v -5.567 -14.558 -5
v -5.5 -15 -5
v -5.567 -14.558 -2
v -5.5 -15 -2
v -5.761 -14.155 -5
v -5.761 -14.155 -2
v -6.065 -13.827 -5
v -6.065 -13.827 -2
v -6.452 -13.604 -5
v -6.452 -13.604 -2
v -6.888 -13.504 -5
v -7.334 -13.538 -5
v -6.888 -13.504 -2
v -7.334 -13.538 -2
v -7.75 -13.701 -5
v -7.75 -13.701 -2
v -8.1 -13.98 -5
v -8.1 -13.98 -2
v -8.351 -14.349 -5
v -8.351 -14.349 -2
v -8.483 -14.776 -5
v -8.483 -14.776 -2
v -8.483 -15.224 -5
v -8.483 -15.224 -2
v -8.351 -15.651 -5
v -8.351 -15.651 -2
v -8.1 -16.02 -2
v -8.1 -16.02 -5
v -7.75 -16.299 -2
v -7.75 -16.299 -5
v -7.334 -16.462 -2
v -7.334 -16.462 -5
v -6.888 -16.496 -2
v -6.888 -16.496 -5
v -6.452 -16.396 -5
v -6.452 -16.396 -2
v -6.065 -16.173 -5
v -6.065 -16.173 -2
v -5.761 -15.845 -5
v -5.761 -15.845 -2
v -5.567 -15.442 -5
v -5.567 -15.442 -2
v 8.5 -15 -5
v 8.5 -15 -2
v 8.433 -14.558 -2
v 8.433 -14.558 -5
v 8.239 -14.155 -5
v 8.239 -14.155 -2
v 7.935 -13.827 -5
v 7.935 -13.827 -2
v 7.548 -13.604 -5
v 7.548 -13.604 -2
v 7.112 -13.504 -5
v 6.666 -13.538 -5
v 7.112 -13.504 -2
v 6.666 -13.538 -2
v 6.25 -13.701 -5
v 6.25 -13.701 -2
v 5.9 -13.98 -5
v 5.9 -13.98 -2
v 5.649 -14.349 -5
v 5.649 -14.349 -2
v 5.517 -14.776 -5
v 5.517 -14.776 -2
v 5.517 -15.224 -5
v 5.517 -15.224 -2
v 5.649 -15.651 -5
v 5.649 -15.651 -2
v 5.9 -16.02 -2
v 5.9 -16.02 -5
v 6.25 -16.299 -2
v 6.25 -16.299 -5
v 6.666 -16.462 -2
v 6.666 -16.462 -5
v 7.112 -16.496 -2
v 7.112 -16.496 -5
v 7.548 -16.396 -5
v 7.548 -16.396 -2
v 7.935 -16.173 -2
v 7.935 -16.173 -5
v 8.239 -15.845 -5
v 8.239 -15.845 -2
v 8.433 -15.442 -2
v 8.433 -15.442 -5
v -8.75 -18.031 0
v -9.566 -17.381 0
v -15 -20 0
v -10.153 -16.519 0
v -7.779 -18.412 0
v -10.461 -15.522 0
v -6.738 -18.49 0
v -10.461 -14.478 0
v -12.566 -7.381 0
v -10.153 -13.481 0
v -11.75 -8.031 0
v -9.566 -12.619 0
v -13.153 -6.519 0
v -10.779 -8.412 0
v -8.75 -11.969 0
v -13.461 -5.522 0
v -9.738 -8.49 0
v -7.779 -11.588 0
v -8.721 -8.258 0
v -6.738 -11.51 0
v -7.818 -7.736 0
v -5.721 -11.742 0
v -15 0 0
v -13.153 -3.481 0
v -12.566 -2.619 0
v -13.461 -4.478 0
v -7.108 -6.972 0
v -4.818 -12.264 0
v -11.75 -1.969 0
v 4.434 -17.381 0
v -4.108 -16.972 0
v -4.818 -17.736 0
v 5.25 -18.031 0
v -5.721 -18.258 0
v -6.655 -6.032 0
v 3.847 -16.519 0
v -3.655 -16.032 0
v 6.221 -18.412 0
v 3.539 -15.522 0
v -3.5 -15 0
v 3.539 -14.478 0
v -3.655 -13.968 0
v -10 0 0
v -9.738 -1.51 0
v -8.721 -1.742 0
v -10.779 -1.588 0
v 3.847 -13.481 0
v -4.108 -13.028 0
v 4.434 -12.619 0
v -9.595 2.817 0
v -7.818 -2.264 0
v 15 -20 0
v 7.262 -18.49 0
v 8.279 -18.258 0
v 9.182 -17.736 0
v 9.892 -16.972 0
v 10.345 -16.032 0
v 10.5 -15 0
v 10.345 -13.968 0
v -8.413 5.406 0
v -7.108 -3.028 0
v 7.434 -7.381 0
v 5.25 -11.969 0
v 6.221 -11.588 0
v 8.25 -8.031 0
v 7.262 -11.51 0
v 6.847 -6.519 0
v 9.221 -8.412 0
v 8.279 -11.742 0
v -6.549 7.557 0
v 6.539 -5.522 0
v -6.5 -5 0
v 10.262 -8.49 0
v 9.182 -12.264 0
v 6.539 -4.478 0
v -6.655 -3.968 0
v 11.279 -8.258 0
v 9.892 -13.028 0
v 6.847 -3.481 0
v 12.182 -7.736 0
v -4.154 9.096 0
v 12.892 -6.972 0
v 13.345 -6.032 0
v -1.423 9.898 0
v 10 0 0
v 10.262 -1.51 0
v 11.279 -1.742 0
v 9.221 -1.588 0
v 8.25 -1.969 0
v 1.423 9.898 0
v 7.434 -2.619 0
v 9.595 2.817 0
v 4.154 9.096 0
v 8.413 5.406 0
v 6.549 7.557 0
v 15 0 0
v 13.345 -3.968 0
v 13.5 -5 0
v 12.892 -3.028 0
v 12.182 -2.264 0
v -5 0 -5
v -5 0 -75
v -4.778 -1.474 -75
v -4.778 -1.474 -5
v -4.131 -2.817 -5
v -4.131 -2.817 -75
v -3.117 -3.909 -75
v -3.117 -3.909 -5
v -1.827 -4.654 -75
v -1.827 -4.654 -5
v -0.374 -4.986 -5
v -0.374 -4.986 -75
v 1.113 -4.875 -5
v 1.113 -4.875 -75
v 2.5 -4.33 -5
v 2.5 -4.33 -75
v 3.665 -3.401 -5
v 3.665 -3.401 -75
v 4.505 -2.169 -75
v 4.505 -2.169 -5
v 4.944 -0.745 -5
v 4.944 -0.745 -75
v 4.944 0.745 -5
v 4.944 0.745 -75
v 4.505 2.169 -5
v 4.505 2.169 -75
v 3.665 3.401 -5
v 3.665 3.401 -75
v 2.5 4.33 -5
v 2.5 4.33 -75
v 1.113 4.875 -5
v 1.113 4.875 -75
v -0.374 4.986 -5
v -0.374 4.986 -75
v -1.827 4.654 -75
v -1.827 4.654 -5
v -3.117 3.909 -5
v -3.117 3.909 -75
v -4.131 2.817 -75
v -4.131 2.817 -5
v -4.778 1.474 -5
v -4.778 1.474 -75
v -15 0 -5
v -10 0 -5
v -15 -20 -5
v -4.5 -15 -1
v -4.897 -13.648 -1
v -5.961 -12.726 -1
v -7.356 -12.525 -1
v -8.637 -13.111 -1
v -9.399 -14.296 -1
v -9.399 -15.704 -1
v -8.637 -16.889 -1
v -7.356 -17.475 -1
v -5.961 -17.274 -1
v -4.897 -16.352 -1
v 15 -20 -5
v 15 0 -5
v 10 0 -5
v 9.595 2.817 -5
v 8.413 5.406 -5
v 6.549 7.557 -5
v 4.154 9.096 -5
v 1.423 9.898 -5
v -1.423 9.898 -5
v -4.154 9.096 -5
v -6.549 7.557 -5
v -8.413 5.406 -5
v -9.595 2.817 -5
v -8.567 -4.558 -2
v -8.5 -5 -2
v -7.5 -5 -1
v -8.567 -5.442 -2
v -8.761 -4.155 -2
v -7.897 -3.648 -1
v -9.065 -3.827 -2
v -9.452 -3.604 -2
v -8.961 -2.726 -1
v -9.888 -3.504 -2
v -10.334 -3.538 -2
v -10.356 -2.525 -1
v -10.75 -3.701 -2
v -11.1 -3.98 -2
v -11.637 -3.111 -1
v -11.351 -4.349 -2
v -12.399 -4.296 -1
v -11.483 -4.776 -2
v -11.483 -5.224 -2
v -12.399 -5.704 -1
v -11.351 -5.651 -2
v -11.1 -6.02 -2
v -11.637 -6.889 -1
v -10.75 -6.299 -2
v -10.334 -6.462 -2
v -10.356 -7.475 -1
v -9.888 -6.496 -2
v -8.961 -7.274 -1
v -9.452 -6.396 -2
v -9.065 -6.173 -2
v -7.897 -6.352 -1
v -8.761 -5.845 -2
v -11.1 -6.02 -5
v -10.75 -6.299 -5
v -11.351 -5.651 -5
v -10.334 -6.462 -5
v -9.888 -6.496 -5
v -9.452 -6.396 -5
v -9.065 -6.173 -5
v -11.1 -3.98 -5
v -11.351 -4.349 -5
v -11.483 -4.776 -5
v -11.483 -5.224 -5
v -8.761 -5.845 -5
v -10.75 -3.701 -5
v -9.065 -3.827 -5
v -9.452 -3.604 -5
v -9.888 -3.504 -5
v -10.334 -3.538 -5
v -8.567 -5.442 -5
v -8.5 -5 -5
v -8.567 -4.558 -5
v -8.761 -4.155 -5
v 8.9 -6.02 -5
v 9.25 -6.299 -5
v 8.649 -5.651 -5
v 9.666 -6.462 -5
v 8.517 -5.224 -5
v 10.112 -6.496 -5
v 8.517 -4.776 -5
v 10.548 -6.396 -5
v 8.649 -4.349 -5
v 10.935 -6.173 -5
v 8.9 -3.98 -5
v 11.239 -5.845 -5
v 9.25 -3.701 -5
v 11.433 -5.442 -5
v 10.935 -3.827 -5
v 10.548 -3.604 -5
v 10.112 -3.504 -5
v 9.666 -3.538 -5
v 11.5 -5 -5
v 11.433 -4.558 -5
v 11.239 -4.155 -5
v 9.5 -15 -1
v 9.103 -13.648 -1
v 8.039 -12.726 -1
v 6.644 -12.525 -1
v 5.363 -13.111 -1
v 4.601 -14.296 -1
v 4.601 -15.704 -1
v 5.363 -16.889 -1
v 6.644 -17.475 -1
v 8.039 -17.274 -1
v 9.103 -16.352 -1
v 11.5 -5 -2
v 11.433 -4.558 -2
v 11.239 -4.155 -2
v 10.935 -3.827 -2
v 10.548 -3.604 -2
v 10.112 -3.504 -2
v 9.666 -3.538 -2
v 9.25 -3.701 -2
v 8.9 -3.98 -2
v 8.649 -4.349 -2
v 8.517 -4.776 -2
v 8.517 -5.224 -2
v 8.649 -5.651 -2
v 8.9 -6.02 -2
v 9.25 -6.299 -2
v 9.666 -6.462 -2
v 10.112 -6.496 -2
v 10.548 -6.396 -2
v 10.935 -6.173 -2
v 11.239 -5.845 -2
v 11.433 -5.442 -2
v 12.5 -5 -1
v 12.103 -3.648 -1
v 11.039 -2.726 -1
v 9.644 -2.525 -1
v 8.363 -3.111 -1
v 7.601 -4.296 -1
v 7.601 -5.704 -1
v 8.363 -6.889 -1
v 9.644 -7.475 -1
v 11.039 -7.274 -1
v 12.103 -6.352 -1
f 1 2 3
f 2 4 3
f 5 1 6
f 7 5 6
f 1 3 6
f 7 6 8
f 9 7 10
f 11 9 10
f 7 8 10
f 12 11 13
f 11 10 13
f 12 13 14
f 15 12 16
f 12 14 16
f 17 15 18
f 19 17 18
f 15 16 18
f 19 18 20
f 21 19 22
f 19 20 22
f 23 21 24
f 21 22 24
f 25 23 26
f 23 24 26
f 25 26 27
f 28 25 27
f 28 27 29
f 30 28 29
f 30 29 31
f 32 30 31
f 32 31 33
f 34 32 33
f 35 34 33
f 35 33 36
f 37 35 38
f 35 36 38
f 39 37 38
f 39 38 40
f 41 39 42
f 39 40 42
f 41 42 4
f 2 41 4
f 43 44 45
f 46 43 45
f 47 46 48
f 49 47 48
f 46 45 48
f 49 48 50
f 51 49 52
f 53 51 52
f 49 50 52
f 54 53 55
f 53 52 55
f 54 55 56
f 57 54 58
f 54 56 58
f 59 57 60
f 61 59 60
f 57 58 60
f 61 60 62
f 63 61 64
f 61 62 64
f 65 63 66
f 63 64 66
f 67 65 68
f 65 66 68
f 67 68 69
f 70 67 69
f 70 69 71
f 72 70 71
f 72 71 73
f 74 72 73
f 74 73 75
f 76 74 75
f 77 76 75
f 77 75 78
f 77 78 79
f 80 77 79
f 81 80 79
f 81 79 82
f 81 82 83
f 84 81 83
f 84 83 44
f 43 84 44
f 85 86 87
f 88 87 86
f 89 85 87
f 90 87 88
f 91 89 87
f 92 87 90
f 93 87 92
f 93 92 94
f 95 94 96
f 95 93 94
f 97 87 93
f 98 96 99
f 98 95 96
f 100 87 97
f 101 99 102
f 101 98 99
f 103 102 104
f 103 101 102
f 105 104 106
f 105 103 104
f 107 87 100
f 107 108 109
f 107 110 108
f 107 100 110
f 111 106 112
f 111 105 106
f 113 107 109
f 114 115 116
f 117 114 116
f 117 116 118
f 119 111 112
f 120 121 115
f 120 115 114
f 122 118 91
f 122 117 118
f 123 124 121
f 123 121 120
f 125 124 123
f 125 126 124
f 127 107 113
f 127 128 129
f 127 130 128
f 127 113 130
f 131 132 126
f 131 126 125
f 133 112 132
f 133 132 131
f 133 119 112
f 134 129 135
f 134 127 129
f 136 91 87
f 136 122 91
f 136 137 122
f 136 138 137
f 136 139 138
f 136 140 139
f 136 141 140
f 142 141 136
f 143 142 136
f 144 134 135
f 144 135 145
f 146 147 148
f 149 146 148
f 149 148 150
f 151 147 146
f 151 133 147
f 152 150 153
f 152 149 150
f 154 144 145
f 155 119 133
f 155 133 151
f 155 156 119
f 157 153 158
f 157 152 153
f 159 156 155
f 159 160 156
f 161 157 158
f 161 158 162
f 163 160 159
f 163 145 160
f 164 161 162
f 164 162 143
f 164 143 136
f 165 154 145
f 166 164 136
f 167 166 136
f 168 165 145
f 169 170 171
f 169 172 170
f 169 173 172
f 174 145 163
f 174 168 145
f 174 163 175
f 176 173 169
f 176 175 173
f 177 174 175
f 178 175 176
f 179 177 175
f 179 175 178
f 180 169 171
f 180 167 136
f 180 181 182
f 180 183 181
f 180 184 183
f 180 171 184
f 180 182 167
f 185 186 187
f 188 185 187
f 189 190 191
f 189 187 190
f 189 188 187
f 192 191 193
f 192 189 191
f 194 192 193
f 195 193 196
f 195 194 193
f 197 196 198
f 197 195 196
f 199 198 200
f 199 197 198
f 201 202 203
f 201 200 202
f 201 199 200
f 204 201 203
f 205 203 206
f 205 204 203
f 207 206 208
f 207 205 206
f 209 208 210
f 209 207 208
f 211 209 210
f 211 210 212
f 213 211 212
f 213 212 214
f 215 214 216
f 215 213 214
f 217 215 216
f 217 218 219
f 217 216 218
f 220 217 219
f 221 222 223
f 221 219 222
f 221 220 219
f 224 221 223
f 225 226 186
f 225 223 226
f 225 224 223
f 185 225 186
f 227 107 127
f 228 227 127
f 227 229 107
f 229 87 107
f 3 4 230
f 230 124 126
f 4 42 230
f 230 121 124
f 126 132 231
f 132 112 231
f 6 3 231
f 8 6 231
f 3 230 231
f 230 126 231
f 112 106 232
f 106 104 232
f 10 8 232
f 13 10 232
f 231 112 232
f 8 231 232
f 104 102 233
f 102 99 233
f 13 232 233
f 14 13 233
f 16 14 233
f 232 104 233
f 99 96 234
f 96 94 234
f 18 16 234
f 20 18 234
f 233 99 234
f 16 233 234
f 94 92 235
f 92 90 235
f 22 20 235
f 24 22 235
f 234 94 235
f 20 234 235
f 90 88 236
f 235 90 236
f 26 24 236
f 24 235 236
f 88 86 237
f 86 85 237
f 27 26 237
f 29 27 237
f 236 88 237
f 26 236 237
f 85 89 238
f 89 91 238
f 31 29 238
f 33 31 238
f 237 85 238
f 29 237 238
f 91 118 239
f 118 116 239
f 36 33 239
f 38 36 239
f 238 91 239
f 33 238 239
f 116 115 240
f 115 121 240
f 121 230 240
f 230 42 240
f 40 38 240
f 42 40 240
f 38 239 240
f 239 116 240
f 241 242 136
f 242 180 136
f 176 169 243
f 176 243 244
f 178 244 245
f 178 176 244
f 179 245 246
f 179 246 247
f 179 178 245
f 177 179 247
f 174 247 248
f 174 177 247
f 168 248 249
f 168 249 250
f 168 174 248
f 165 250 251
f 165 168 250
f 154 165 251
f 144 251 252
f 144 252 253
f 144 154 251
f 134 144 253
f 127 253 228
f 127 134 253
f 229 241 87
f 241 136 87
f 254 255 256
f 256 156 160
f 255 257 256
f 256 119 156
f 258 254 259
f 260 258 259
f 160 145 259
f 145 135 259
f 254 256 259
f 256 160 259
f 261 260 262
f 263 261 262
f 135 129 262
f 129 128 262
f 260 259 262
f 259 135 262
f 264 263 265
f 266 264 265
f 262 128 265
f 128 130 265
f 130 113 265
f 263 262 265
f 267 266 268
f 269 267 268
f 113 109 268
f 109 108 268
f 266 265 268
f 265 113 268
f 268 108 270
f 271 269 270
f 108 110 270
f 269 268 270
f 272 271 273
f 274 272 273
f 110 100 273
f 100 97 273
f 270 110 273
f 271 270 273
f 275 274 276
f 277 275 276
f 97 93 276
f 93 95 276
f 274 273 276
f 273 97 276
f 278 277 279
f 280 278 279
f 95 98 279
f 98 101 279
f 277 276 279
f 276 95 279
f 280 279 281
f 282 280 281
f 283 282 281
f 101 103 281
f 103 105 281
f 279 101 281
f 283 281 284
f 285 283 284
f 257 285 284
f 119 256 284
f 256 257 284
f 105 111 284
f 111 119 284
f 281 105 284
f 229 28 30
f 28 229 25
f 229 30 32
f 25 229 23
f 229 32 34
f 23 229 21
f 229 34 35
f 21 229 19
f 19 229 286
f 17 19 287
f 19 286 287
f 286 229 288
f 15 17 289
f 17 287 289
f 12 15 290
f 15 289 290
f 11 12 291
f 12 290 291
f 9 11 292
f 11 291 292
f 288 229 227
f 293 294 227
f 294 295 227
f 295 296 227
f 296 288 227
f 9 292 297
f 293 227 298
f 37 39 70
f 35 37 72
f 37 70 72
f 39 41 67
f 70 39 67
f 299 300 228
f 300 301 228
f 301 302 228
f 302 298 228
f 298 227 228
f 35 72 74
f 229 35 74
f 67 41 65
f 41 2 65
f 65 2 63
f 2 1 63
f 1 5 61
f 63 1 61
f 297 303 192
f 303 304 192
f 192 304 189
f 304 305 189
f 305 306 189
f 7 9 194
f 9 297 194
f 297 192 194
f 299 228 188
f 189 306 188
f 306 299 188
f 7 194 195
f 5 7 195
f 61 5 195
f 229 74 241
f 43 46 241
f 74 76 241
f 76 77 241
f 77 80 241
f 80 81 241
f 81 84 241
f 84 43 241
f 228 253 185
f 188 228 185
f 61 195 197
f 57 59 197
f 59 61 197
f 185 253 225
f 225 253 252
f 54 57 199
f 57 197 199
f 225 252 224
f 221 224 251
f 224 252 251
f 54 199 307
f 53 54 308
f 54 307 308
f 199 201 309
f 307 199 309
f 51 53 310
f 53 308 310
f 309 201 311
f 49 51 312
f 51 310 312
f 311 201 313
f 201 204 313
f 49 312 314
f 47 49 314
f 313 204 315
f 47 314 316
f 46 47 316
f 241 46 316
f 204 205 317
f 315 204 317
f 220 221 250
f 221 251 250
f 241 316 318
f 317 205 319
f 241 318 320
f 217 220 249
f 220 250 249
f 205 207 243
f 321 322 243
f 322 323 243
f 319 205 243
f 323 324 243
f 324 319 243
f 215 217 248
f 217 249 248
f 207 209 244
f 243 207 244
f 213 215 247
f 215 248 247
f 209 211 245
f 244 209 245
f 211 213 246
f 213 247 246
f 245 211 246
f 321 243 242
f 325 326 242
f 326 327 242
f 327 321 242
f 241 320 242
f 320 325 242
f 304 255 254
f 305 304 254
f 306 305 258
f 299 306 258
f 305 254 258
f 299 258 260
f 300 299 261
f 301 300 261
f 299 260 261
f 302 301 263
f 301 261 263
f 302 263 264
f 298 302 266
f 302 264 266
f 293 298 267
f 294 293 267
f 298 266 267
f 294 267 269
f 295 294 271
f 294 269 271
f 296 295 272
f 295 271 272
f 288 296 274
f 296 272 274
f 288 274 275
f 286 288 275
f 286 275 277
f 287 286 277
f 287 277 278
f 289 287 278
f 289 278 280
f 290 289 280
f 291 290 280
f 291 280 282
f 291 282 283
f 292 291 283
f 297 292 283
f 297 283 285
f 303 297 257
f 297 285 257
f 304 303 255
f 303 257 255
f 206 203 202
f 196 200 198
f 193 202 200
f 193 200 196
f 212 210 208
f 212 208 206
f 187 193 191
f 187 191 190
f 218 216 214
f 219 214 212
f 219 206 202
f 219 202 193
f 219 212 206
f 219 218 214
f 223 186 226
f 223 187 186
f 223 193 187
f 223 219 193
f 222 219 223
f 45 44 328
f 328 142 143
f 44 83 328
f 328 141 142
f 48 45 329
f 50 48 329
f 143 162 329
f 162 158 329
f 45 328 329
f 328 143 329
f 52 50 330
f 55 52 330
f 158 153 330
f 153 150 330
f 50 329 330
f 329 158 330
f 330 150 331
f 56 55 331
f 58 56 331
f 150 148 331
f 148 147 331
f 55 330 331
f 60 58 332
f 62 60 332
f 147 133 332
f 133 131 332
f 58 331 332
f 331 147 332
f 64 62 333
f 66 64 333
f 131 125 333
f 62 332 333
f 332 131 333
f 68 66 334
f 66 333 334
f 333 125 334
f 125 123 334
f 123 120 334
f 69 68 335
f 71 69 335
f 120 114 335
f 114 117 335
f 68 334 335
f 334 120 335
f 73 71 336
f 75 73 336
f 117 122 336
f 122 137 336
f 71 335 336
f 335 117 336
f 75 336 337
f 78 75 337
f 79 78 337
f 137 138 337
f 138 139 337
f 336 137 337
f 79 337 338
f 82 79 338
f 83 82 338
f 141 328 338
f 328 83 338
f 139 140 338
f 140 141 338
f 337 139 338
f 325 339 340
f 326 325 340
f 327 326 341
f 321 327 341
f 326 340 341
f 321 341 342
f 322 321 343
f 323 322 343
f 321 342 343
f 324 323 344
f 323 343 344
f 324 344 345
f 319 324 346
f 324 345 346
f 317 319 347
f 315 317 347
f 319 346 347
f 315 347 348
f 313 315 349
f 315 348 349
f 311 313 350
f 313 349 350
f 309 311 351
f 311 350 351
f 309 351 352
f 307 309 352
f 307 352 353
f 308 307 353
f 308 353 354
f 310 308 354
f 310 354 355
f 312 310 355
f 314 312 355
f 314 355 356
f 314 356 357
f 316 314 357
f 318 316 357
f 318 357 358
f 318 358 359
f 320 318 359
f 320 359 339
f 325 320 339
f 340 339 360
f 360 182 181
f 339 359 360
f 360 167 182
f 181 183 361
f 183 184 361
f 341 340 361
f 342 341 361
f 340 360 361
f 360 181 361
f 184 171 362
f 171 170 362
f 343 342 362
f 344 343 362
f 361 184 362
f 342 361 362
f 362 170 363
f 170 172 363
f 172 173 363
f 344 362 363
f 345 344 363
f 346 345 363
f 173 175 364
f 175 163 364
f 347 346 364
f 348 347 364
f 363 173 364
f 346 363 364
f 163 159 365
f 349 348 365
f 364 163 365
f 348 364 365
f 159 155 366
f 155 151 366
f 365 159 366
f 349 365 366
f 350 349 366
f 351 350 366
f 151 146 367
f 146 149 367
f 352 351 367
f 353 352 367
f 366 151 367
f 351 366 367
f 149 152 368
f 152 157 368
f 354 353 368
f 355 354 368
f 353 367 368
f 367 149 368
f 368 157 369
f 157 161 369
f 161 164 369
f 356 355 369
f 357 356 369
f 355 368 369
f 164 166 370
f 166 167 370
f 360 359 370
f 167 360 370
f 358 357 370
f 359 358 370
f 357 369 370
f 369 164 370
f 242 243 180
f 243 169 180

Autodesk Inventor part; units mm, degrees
ref_plane "YZ Plane" through (0, 0, 0) normal (1, 0, 0) x (0, 1, 0)
ref_plane "XZ Plane" through (0, 0, 0) normal (0, 1, 0) x (-1, 0, 0)
ref_plane "XY Plane" through (0, 0, 0) normal (0, 0, 1) x (1, 0, 0)
sketch "草图1" plane through (0, 0, 0) normal (0, 0, 1) x (1, 0, 0)
  arc A0 (10, 0) -> (-10, 0) centre (0, 0) ccw
  line L0 (-15, 0) -> (15, 0)
  line L1 (15, 0) -> (15, -20)
  line L2 (15, -20) -> (-15, -20)
  line L3 (-15, -20) -> (-15, 0)
  circle A1 centre (10, -5) radius 1.5
  circle A2 centre (7, -15) radius 1.5
  circle A3 centre (-10, -5) radius 1.5
  circle A4 centre (-7, -15) radius 1.5
  dimension "d0" = 20
  dimension "d1" = 30
  dimension "d2" = 20
  dimension "d3" = 3
  dimension "d4" = 3
  dimension "d5" = 3
  dimension "d6" = 3
  dimension "d7" = 5
  dimension "d8" = 5
  dimension "d9" = 5
  dimension "d10" = 5
  dimension "d11" = 8
  dimension "d12" = 5
  dimension "d13" = 5
  dimension "d14" = 8
extrude "拉伸1" add sketch "草图1" against normal blind 5
sketch "草图2" plane through (0, 0, -5) normal (0, 0, -1) x (-1, 0, 0)
  circle A0 centre (0, 0) radius 5
  dimension "d17" = 10
extrude "拉伸2" add sketch "草图2" along normal blind 70
chamfer "倒角1" distance 2 angle 45 4 edges at (-11.5, -5, 0) (-8.5, -15, 0) (5.5, -15, 0) (8.5, -5, 0)
properties part number "夹具固定销"
